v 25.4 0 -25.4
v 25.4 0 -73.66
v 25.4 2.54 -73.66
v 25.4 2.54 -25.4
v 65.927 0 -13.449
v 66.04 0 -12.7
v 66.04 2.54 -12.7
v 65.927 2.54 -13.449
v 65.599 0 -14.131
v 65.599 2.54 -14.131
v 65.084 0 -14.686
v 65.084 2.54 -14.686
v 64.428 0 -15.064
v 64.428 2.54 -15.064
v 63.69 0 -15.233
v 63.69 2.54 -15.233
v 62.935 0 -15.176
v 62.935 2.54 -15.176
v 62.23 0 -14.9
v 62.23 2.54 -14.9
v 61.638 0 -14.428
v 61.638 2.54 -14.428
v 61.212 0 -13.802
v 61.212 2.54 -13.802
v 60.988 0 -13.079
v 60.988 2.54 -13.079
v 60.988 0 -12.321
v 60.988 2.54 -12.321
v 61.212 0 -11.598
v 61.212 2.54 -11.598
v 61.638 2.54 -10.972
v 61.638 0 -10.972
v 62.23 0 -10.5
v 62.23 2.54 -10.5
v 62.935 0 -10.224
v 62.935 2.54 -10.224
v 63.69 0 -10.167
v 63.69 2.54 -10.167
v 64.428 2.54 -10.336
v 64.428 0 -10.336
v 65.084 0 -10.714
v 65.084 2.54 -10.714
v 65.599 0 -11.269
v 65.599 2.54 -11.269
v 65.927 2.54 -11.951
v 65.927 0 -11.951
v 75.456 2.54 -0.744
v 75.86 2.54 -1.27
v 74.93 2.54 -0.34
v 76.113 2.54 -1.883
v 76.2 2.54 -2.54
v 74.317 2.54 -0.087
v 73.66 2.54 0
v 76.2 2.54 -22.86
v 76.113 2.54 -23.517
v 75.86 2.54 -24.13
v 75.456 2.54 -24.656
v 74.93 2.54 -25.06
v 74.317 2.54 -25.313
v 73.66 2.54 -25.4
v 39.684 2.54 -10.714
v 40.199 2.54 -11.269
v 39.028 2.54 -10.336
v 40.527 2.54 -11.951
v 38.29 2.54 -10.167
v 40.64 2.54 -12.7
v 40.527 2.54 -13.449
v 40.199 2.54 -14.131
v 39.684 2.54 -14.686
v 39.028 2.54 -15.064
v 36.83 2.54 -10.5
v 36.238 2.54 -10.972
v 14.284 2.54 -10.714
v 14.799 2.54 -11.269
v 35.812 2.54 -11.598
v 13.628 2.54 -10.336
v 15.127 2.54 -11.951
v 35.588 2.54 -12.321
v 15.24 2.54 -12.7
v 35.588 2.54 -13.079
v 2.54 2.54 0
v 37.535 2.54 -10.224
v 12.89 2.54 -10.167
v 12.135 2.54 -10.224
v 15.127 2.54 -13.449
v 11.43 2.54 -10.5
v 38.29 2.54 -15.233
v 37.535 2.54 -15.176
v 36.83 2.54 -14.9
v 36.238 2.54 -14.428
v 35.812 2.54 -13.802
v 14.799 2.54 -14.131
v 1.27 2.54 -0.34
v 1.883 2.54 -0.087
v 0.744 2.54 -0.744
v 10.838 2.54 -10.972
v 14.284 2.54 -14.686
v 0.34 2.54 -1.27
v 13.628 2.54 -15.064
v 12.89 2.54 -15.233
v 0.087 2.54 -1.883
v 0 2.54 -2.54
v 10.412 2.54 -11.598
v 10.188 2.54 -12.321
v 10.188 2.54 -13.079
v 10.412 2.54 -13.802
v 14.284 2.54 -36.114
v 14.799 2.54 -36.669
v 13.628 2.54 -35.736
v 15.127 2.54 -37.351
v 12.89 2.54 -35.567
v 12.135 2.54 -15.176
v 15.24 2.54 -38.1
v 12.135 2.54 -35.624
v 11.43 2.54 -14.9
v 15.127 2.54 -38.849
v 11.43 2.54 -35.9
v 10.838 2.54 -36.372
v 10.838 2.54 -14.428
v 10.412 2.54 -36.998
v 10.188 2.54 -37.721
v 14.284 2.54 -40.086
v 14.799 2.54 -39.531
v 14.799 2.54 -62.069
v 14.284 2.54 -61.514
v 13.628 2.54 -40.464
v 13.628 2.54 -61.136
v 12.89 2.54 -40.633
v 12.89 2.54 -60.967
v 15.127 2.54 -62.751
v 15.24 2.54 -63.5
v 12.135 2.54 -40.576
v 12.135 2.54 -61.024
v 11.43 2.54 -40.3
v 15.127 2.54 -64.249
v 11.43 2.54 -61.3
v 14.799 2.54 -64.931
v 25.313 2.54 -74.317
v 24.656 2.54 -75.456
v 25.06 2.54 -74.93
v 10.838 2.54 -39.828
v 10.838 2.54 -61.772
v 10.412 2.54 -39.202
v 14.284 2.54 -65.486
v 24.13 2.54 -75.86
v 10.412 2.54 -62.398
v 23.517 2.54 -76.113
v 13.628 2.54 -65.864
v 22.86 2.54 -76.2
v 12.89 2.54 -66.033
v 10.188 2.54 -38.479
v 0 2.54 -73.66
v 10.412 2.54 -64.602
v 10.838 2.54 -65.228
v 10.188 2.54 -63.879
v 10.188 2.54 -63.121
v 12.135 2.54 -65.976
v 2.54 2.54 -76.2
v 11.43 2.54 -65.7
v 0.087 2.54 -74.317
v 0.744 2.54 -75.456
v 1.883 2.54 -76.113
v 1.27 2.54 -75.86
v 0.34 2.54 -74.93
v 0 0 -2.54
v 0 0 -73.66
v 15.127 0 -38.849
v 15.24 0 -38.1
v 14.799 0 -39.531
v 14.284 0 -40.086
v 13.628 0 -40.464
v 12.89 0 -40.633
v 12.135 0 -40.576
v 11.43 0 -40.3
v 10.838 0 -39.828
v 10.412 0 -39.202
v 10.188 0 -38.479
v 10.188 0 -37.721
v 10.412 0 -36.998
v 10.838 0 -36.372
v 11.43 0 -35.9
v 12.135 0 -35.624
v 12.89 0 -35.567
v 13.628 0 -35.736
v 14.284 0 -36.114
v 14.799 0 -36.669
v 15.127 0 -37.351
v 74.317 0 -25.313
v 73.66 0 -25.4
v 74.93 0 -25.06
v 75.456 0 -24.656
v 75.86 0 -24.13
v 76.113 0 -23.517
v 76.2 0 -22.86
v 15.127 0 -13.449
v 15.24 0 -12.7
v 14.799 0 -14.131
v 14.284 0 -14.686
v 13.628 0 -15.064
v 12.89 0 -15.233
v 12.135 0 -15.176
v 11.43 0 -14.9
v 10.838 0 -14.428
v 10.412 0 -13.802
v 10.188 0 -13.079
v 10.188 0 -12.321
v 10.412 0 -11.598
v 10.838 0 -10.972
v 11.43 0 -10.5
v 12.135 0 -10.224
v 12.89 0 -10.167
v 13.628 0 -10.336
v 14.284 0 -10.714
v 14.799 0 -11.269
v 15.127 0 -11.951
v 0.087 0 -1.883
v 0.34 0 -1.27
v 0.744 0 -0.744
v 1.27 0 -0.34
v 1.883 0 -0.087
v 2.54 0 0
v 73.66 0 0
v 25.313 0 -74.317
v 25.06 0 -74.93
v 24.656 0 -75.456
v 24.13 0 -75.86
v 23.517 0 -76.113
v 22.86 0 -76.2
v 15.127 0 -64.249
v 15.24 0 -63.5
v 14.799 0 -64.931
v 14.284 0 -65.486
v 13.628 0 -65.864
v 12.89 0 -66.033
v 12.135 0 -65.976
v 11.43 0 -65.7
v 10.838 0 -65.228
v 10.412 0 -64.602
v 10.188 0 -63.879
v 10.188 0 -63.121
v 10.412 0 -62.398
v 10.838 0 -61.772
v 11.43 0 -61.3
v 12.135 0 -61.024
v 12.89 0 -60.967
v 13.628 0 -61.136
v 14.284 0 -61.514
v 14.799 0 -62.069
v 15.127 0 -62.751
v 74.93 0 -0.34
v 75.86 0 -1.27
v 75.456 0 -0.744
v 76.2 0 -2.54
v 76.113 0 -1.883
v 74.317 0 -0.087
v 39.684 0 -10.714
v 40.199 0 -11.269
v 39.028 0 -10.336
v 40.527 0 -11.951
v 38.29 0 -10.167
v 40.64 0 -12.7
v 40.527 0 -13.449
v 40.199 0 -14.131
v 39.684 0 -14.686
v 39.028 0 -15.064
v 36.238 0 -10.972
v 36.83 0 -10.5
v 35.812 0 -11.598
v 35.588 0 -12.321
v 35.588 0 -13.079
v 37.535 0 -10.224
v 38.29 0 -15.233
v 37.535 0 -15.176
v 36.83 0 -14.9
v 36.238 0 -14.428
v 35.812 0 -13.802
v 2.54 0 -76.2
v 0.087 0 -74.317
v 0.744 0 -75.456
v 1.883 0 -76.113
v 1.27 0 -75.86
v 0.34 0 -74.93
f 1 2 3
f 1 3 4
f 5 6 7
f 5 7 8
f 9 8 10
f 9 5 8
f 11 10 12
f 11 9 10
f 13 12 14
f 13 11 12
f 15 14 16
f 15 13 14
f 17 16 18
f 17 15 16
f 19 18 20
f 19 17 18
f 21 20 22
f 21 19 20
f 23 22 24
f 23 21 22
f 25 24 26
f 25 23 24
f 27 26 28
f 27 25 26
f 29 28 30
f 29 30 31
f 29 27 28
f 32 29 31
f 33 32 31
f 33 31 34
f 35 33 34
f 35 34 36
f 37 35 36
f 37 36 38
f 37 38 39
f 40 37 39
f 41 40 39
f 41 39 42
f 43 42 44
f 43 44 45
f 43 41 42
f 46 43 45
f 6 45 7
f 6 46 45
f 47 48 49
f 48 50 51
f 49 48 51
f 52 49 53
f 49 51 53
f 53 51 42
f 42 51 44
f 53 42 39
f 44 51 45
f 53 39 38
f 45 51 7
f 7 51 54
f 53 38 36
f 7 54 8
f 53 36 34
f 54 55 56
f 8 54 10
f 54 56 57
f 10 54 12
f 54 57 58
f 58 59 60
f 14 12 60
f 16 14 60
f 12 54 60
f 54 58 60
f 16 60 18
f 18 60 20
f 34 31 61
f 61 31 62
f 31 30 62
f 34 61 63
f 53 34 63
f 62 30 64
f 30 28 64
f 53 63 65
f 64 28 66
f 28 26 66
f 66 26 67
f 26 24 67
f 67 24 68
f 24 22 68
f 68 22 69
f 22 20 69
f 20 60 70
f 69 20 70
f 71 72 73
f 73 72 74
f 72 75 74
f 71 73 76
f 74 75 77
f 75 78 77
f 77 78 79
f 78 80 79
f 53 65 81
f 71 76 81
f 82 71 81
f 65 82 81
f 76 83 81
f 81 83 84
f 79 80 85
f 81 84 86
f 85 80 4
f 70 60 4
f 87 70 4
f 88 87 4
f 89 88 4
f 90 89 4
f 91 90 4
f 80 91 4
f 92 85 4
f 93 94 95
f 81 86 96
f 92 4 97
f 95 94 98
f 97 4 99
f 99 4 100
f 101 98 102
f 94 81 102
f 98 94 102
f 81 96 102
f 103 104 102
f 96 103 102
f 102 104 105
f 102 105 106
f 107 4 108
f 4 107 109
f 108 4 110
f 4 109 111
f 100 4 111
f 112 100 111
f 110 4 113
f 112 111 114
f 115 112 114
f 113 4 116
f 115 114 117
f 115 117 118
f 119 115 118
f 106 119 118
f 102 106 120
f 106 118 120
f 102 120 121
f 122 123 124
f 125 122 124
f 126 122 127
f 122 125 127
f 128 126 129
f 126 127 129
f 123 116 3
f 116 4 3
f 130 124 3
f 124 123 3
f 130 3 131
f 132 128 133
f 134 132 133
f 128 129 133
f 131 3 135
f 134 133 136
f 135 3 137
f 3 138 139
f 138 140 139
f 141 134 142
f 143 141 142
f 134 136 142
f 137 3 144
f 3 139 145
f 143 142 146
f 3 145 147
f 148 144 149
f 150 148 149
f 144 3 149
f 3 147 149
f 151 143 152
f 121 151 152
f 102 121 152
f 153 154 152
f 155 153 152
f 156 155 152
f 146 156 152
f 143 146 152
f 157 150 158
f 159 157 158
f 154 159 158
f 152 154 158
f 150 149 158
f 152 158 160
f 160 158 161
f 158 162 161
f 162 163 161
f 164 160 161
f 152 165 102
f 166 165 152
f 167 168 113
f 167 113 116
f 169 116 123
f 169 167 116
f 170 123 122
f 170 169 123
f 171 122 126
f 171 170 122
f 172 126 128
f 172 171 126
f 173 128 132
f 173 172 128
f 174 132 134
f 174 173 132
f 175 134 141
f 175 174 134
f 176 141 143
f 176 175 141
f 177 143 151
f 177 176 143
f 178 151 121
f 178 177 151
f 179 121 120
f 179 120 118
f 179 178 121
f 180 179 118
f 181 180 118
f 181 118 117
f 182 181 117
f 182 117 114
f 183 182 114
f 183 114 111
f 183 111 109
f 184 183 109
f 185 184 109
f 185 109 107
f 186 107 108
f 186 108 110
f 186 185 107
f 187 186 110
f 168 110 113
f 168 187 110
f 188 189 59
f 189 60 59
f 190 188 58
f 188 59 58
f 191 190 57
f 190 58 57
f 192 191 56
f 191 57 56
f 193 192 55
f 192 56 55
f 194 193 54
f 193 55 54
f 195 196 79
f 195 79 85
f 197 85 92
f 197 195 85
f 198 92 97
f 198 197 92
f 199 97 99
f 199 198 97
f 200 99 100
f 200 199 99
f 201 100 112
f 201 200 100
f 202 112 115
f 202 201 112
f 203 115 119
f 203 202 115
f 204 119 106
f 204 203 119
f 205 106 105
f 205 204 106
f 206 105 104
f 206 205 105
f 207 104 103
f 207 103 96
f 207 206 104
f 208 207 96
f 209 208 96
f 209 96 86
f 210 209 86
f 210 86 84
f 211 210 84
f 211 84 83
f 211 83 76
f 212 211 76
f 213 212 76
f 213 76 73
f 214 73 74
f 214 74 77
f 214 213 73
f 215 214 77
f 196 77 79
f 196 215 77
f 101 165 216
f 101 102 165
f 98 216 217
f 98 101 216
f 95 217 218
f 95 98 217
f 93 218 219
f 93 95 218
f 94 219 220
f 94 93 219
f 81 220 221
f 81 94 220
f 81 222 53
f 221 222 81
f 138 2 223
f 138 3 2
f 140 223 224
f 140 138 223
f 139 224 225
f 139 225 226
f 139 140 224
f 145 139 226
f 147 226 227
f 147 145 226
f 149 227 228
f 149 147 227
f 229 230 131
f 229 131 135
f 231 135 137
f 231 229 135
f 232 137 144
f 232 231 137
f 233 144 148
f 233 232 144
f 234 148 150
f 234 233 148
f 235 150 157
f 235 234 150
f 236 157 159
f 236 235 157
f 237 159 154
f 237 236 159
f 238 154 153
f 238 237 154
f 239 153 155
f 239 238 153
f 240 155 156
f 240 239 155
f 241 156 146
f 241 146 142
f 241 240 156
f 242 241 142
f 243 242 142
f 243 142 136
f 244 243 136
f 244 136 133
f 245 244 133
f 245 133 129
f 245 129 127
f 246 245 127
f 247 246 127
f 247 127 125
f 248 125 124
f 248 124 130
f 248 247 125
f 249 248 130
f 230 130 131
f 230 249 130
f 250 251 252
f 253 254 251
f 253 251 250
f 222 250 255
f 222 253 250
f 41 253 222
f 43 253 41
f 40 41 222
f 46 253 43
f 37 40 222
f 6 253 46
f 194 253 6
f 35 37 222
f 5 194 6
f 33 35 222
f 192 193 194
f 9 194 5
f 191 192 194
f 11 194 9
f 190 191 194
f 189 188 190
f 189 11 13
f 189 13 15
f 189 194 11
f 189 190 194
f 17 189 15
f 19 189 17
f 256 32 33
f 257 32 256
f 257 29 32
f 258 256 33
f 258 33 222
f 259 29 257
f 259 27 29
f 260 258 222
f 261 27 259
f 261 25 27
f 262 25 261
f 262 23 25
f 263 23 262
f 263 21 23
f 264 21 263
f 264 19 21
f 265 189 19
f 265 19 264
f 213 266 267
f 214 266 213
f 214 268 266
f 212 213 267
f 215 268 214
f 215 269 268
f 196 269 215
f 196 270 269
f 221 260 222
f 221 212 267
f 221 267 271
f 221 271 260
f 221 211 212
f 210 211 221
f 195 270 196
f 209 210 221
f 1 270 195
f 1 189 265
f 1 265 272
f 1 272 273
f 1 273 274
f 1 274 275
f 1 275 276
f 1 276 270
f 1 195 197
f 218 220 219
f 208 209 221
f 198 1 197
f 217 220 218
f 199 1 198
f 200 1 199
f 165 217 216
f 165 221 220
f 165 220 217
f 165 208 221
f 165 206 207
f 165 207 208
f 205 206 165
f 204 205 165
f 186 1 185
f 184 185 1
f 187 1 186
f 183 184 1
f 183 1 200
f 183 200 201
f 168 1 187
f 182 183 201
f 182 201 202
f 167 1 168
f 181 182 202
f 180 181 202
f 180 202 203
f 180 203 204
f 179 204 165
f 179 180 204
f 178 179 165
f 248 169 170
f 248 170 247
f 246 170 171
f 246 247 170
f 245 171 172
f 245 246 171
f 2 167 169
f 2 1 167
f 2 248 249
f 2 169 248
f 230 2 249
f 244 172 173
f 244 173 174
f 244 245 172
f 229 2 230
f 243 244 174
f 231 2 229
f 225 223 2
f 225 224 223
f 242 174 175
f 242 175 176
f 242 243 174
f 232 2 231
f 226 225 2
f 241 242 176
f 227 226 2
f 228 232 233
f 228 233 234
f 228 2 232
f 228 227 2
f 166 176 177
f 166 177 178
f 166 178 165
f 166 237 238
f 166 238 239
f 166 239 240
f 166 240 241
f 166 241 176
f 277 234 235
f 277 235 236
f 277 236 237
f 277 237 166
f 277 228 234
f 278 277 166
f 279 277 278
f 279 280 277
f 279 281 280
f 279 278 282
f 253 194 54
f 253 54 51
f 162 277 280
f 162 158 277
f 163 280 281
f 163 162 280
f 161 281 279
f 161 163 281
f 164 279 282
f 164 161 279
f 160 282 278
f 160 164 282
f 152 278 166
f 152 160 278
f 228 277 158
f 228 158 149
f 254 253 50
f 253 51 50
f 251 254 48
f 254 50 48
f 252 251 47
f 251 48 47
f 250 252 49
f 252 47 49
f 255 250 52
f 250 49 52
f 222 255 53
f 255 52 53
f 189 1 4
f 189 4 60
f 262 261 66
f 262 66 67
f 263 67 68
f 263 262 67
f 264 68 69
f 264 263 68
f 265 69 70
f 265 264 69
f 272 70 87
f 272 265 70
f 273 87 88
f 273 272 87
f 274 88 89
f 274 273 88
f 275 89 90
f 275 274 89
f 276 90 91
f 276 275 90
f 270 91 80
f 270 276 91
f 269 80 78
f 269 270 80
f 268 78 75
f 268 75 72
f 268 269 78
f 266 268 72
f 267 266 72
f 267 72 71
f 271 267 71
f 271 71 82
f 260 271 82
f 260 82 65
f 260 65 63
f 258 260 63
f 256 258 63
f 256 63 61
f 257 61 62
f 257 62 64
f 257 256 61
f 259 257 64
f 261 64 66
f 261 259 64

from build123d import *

# Parameters (mm, degrees)
SKETCH1_R           = 2.54
BOSS_EXTRUDE1_DEPTH = 2.54
FILLET1_R           = 2.54


with BuildPart() as part:
    # Sketch1 → Boss-Extrude1 (new body)
    with BuildSketch(Plane(origin=(0, 0, 0), x_dir=(1, 0, 0), z_dir=(0, 1, 0))):
        Polygon((25.4, 76.2), (25.4, 25.4), (76.2, 25.4), (76.2, 0), (0, 0), (0, 76.2), align=None)
        with Locations((12.7, 12.7)):
            Circle(SKETCH1_R, mode=Mode.SUBTRACT)
        with Locations((38.1, 12.7)):
            Circle(SKETCH1_R, mode=Mode.SUBTRACT)
        with Locations((63.5, 12.7)):
            Circle(SKETCH1_R, mode=Mode.SUBTRACT)
        with Locations((12.7, 38.1)):
            Circle(SKETCH1_R, mode=Mode.SUBTRACT)
        with Locations((12.7, 63.5)):
            Circle(SKETCH1_R, mode=Mode.SUBTRACT)
    extrude(amount=BOSS_EXTRUDE1_DEPTH)

    # Fillet1
    fillet1_edges = [part.edges().sort_by_distance(p)[0] for p in [
        (0, 1.27, -76.2),
        (25.4, 1.27, -76.2),
        (76.2, 1.27, -25.4),
        (76.2, 1.27, 0),
        (0, 1.27, 0),
    ]]
    fillet(fillet1_edges, radius=FILLET1_R)


solid = part.part
